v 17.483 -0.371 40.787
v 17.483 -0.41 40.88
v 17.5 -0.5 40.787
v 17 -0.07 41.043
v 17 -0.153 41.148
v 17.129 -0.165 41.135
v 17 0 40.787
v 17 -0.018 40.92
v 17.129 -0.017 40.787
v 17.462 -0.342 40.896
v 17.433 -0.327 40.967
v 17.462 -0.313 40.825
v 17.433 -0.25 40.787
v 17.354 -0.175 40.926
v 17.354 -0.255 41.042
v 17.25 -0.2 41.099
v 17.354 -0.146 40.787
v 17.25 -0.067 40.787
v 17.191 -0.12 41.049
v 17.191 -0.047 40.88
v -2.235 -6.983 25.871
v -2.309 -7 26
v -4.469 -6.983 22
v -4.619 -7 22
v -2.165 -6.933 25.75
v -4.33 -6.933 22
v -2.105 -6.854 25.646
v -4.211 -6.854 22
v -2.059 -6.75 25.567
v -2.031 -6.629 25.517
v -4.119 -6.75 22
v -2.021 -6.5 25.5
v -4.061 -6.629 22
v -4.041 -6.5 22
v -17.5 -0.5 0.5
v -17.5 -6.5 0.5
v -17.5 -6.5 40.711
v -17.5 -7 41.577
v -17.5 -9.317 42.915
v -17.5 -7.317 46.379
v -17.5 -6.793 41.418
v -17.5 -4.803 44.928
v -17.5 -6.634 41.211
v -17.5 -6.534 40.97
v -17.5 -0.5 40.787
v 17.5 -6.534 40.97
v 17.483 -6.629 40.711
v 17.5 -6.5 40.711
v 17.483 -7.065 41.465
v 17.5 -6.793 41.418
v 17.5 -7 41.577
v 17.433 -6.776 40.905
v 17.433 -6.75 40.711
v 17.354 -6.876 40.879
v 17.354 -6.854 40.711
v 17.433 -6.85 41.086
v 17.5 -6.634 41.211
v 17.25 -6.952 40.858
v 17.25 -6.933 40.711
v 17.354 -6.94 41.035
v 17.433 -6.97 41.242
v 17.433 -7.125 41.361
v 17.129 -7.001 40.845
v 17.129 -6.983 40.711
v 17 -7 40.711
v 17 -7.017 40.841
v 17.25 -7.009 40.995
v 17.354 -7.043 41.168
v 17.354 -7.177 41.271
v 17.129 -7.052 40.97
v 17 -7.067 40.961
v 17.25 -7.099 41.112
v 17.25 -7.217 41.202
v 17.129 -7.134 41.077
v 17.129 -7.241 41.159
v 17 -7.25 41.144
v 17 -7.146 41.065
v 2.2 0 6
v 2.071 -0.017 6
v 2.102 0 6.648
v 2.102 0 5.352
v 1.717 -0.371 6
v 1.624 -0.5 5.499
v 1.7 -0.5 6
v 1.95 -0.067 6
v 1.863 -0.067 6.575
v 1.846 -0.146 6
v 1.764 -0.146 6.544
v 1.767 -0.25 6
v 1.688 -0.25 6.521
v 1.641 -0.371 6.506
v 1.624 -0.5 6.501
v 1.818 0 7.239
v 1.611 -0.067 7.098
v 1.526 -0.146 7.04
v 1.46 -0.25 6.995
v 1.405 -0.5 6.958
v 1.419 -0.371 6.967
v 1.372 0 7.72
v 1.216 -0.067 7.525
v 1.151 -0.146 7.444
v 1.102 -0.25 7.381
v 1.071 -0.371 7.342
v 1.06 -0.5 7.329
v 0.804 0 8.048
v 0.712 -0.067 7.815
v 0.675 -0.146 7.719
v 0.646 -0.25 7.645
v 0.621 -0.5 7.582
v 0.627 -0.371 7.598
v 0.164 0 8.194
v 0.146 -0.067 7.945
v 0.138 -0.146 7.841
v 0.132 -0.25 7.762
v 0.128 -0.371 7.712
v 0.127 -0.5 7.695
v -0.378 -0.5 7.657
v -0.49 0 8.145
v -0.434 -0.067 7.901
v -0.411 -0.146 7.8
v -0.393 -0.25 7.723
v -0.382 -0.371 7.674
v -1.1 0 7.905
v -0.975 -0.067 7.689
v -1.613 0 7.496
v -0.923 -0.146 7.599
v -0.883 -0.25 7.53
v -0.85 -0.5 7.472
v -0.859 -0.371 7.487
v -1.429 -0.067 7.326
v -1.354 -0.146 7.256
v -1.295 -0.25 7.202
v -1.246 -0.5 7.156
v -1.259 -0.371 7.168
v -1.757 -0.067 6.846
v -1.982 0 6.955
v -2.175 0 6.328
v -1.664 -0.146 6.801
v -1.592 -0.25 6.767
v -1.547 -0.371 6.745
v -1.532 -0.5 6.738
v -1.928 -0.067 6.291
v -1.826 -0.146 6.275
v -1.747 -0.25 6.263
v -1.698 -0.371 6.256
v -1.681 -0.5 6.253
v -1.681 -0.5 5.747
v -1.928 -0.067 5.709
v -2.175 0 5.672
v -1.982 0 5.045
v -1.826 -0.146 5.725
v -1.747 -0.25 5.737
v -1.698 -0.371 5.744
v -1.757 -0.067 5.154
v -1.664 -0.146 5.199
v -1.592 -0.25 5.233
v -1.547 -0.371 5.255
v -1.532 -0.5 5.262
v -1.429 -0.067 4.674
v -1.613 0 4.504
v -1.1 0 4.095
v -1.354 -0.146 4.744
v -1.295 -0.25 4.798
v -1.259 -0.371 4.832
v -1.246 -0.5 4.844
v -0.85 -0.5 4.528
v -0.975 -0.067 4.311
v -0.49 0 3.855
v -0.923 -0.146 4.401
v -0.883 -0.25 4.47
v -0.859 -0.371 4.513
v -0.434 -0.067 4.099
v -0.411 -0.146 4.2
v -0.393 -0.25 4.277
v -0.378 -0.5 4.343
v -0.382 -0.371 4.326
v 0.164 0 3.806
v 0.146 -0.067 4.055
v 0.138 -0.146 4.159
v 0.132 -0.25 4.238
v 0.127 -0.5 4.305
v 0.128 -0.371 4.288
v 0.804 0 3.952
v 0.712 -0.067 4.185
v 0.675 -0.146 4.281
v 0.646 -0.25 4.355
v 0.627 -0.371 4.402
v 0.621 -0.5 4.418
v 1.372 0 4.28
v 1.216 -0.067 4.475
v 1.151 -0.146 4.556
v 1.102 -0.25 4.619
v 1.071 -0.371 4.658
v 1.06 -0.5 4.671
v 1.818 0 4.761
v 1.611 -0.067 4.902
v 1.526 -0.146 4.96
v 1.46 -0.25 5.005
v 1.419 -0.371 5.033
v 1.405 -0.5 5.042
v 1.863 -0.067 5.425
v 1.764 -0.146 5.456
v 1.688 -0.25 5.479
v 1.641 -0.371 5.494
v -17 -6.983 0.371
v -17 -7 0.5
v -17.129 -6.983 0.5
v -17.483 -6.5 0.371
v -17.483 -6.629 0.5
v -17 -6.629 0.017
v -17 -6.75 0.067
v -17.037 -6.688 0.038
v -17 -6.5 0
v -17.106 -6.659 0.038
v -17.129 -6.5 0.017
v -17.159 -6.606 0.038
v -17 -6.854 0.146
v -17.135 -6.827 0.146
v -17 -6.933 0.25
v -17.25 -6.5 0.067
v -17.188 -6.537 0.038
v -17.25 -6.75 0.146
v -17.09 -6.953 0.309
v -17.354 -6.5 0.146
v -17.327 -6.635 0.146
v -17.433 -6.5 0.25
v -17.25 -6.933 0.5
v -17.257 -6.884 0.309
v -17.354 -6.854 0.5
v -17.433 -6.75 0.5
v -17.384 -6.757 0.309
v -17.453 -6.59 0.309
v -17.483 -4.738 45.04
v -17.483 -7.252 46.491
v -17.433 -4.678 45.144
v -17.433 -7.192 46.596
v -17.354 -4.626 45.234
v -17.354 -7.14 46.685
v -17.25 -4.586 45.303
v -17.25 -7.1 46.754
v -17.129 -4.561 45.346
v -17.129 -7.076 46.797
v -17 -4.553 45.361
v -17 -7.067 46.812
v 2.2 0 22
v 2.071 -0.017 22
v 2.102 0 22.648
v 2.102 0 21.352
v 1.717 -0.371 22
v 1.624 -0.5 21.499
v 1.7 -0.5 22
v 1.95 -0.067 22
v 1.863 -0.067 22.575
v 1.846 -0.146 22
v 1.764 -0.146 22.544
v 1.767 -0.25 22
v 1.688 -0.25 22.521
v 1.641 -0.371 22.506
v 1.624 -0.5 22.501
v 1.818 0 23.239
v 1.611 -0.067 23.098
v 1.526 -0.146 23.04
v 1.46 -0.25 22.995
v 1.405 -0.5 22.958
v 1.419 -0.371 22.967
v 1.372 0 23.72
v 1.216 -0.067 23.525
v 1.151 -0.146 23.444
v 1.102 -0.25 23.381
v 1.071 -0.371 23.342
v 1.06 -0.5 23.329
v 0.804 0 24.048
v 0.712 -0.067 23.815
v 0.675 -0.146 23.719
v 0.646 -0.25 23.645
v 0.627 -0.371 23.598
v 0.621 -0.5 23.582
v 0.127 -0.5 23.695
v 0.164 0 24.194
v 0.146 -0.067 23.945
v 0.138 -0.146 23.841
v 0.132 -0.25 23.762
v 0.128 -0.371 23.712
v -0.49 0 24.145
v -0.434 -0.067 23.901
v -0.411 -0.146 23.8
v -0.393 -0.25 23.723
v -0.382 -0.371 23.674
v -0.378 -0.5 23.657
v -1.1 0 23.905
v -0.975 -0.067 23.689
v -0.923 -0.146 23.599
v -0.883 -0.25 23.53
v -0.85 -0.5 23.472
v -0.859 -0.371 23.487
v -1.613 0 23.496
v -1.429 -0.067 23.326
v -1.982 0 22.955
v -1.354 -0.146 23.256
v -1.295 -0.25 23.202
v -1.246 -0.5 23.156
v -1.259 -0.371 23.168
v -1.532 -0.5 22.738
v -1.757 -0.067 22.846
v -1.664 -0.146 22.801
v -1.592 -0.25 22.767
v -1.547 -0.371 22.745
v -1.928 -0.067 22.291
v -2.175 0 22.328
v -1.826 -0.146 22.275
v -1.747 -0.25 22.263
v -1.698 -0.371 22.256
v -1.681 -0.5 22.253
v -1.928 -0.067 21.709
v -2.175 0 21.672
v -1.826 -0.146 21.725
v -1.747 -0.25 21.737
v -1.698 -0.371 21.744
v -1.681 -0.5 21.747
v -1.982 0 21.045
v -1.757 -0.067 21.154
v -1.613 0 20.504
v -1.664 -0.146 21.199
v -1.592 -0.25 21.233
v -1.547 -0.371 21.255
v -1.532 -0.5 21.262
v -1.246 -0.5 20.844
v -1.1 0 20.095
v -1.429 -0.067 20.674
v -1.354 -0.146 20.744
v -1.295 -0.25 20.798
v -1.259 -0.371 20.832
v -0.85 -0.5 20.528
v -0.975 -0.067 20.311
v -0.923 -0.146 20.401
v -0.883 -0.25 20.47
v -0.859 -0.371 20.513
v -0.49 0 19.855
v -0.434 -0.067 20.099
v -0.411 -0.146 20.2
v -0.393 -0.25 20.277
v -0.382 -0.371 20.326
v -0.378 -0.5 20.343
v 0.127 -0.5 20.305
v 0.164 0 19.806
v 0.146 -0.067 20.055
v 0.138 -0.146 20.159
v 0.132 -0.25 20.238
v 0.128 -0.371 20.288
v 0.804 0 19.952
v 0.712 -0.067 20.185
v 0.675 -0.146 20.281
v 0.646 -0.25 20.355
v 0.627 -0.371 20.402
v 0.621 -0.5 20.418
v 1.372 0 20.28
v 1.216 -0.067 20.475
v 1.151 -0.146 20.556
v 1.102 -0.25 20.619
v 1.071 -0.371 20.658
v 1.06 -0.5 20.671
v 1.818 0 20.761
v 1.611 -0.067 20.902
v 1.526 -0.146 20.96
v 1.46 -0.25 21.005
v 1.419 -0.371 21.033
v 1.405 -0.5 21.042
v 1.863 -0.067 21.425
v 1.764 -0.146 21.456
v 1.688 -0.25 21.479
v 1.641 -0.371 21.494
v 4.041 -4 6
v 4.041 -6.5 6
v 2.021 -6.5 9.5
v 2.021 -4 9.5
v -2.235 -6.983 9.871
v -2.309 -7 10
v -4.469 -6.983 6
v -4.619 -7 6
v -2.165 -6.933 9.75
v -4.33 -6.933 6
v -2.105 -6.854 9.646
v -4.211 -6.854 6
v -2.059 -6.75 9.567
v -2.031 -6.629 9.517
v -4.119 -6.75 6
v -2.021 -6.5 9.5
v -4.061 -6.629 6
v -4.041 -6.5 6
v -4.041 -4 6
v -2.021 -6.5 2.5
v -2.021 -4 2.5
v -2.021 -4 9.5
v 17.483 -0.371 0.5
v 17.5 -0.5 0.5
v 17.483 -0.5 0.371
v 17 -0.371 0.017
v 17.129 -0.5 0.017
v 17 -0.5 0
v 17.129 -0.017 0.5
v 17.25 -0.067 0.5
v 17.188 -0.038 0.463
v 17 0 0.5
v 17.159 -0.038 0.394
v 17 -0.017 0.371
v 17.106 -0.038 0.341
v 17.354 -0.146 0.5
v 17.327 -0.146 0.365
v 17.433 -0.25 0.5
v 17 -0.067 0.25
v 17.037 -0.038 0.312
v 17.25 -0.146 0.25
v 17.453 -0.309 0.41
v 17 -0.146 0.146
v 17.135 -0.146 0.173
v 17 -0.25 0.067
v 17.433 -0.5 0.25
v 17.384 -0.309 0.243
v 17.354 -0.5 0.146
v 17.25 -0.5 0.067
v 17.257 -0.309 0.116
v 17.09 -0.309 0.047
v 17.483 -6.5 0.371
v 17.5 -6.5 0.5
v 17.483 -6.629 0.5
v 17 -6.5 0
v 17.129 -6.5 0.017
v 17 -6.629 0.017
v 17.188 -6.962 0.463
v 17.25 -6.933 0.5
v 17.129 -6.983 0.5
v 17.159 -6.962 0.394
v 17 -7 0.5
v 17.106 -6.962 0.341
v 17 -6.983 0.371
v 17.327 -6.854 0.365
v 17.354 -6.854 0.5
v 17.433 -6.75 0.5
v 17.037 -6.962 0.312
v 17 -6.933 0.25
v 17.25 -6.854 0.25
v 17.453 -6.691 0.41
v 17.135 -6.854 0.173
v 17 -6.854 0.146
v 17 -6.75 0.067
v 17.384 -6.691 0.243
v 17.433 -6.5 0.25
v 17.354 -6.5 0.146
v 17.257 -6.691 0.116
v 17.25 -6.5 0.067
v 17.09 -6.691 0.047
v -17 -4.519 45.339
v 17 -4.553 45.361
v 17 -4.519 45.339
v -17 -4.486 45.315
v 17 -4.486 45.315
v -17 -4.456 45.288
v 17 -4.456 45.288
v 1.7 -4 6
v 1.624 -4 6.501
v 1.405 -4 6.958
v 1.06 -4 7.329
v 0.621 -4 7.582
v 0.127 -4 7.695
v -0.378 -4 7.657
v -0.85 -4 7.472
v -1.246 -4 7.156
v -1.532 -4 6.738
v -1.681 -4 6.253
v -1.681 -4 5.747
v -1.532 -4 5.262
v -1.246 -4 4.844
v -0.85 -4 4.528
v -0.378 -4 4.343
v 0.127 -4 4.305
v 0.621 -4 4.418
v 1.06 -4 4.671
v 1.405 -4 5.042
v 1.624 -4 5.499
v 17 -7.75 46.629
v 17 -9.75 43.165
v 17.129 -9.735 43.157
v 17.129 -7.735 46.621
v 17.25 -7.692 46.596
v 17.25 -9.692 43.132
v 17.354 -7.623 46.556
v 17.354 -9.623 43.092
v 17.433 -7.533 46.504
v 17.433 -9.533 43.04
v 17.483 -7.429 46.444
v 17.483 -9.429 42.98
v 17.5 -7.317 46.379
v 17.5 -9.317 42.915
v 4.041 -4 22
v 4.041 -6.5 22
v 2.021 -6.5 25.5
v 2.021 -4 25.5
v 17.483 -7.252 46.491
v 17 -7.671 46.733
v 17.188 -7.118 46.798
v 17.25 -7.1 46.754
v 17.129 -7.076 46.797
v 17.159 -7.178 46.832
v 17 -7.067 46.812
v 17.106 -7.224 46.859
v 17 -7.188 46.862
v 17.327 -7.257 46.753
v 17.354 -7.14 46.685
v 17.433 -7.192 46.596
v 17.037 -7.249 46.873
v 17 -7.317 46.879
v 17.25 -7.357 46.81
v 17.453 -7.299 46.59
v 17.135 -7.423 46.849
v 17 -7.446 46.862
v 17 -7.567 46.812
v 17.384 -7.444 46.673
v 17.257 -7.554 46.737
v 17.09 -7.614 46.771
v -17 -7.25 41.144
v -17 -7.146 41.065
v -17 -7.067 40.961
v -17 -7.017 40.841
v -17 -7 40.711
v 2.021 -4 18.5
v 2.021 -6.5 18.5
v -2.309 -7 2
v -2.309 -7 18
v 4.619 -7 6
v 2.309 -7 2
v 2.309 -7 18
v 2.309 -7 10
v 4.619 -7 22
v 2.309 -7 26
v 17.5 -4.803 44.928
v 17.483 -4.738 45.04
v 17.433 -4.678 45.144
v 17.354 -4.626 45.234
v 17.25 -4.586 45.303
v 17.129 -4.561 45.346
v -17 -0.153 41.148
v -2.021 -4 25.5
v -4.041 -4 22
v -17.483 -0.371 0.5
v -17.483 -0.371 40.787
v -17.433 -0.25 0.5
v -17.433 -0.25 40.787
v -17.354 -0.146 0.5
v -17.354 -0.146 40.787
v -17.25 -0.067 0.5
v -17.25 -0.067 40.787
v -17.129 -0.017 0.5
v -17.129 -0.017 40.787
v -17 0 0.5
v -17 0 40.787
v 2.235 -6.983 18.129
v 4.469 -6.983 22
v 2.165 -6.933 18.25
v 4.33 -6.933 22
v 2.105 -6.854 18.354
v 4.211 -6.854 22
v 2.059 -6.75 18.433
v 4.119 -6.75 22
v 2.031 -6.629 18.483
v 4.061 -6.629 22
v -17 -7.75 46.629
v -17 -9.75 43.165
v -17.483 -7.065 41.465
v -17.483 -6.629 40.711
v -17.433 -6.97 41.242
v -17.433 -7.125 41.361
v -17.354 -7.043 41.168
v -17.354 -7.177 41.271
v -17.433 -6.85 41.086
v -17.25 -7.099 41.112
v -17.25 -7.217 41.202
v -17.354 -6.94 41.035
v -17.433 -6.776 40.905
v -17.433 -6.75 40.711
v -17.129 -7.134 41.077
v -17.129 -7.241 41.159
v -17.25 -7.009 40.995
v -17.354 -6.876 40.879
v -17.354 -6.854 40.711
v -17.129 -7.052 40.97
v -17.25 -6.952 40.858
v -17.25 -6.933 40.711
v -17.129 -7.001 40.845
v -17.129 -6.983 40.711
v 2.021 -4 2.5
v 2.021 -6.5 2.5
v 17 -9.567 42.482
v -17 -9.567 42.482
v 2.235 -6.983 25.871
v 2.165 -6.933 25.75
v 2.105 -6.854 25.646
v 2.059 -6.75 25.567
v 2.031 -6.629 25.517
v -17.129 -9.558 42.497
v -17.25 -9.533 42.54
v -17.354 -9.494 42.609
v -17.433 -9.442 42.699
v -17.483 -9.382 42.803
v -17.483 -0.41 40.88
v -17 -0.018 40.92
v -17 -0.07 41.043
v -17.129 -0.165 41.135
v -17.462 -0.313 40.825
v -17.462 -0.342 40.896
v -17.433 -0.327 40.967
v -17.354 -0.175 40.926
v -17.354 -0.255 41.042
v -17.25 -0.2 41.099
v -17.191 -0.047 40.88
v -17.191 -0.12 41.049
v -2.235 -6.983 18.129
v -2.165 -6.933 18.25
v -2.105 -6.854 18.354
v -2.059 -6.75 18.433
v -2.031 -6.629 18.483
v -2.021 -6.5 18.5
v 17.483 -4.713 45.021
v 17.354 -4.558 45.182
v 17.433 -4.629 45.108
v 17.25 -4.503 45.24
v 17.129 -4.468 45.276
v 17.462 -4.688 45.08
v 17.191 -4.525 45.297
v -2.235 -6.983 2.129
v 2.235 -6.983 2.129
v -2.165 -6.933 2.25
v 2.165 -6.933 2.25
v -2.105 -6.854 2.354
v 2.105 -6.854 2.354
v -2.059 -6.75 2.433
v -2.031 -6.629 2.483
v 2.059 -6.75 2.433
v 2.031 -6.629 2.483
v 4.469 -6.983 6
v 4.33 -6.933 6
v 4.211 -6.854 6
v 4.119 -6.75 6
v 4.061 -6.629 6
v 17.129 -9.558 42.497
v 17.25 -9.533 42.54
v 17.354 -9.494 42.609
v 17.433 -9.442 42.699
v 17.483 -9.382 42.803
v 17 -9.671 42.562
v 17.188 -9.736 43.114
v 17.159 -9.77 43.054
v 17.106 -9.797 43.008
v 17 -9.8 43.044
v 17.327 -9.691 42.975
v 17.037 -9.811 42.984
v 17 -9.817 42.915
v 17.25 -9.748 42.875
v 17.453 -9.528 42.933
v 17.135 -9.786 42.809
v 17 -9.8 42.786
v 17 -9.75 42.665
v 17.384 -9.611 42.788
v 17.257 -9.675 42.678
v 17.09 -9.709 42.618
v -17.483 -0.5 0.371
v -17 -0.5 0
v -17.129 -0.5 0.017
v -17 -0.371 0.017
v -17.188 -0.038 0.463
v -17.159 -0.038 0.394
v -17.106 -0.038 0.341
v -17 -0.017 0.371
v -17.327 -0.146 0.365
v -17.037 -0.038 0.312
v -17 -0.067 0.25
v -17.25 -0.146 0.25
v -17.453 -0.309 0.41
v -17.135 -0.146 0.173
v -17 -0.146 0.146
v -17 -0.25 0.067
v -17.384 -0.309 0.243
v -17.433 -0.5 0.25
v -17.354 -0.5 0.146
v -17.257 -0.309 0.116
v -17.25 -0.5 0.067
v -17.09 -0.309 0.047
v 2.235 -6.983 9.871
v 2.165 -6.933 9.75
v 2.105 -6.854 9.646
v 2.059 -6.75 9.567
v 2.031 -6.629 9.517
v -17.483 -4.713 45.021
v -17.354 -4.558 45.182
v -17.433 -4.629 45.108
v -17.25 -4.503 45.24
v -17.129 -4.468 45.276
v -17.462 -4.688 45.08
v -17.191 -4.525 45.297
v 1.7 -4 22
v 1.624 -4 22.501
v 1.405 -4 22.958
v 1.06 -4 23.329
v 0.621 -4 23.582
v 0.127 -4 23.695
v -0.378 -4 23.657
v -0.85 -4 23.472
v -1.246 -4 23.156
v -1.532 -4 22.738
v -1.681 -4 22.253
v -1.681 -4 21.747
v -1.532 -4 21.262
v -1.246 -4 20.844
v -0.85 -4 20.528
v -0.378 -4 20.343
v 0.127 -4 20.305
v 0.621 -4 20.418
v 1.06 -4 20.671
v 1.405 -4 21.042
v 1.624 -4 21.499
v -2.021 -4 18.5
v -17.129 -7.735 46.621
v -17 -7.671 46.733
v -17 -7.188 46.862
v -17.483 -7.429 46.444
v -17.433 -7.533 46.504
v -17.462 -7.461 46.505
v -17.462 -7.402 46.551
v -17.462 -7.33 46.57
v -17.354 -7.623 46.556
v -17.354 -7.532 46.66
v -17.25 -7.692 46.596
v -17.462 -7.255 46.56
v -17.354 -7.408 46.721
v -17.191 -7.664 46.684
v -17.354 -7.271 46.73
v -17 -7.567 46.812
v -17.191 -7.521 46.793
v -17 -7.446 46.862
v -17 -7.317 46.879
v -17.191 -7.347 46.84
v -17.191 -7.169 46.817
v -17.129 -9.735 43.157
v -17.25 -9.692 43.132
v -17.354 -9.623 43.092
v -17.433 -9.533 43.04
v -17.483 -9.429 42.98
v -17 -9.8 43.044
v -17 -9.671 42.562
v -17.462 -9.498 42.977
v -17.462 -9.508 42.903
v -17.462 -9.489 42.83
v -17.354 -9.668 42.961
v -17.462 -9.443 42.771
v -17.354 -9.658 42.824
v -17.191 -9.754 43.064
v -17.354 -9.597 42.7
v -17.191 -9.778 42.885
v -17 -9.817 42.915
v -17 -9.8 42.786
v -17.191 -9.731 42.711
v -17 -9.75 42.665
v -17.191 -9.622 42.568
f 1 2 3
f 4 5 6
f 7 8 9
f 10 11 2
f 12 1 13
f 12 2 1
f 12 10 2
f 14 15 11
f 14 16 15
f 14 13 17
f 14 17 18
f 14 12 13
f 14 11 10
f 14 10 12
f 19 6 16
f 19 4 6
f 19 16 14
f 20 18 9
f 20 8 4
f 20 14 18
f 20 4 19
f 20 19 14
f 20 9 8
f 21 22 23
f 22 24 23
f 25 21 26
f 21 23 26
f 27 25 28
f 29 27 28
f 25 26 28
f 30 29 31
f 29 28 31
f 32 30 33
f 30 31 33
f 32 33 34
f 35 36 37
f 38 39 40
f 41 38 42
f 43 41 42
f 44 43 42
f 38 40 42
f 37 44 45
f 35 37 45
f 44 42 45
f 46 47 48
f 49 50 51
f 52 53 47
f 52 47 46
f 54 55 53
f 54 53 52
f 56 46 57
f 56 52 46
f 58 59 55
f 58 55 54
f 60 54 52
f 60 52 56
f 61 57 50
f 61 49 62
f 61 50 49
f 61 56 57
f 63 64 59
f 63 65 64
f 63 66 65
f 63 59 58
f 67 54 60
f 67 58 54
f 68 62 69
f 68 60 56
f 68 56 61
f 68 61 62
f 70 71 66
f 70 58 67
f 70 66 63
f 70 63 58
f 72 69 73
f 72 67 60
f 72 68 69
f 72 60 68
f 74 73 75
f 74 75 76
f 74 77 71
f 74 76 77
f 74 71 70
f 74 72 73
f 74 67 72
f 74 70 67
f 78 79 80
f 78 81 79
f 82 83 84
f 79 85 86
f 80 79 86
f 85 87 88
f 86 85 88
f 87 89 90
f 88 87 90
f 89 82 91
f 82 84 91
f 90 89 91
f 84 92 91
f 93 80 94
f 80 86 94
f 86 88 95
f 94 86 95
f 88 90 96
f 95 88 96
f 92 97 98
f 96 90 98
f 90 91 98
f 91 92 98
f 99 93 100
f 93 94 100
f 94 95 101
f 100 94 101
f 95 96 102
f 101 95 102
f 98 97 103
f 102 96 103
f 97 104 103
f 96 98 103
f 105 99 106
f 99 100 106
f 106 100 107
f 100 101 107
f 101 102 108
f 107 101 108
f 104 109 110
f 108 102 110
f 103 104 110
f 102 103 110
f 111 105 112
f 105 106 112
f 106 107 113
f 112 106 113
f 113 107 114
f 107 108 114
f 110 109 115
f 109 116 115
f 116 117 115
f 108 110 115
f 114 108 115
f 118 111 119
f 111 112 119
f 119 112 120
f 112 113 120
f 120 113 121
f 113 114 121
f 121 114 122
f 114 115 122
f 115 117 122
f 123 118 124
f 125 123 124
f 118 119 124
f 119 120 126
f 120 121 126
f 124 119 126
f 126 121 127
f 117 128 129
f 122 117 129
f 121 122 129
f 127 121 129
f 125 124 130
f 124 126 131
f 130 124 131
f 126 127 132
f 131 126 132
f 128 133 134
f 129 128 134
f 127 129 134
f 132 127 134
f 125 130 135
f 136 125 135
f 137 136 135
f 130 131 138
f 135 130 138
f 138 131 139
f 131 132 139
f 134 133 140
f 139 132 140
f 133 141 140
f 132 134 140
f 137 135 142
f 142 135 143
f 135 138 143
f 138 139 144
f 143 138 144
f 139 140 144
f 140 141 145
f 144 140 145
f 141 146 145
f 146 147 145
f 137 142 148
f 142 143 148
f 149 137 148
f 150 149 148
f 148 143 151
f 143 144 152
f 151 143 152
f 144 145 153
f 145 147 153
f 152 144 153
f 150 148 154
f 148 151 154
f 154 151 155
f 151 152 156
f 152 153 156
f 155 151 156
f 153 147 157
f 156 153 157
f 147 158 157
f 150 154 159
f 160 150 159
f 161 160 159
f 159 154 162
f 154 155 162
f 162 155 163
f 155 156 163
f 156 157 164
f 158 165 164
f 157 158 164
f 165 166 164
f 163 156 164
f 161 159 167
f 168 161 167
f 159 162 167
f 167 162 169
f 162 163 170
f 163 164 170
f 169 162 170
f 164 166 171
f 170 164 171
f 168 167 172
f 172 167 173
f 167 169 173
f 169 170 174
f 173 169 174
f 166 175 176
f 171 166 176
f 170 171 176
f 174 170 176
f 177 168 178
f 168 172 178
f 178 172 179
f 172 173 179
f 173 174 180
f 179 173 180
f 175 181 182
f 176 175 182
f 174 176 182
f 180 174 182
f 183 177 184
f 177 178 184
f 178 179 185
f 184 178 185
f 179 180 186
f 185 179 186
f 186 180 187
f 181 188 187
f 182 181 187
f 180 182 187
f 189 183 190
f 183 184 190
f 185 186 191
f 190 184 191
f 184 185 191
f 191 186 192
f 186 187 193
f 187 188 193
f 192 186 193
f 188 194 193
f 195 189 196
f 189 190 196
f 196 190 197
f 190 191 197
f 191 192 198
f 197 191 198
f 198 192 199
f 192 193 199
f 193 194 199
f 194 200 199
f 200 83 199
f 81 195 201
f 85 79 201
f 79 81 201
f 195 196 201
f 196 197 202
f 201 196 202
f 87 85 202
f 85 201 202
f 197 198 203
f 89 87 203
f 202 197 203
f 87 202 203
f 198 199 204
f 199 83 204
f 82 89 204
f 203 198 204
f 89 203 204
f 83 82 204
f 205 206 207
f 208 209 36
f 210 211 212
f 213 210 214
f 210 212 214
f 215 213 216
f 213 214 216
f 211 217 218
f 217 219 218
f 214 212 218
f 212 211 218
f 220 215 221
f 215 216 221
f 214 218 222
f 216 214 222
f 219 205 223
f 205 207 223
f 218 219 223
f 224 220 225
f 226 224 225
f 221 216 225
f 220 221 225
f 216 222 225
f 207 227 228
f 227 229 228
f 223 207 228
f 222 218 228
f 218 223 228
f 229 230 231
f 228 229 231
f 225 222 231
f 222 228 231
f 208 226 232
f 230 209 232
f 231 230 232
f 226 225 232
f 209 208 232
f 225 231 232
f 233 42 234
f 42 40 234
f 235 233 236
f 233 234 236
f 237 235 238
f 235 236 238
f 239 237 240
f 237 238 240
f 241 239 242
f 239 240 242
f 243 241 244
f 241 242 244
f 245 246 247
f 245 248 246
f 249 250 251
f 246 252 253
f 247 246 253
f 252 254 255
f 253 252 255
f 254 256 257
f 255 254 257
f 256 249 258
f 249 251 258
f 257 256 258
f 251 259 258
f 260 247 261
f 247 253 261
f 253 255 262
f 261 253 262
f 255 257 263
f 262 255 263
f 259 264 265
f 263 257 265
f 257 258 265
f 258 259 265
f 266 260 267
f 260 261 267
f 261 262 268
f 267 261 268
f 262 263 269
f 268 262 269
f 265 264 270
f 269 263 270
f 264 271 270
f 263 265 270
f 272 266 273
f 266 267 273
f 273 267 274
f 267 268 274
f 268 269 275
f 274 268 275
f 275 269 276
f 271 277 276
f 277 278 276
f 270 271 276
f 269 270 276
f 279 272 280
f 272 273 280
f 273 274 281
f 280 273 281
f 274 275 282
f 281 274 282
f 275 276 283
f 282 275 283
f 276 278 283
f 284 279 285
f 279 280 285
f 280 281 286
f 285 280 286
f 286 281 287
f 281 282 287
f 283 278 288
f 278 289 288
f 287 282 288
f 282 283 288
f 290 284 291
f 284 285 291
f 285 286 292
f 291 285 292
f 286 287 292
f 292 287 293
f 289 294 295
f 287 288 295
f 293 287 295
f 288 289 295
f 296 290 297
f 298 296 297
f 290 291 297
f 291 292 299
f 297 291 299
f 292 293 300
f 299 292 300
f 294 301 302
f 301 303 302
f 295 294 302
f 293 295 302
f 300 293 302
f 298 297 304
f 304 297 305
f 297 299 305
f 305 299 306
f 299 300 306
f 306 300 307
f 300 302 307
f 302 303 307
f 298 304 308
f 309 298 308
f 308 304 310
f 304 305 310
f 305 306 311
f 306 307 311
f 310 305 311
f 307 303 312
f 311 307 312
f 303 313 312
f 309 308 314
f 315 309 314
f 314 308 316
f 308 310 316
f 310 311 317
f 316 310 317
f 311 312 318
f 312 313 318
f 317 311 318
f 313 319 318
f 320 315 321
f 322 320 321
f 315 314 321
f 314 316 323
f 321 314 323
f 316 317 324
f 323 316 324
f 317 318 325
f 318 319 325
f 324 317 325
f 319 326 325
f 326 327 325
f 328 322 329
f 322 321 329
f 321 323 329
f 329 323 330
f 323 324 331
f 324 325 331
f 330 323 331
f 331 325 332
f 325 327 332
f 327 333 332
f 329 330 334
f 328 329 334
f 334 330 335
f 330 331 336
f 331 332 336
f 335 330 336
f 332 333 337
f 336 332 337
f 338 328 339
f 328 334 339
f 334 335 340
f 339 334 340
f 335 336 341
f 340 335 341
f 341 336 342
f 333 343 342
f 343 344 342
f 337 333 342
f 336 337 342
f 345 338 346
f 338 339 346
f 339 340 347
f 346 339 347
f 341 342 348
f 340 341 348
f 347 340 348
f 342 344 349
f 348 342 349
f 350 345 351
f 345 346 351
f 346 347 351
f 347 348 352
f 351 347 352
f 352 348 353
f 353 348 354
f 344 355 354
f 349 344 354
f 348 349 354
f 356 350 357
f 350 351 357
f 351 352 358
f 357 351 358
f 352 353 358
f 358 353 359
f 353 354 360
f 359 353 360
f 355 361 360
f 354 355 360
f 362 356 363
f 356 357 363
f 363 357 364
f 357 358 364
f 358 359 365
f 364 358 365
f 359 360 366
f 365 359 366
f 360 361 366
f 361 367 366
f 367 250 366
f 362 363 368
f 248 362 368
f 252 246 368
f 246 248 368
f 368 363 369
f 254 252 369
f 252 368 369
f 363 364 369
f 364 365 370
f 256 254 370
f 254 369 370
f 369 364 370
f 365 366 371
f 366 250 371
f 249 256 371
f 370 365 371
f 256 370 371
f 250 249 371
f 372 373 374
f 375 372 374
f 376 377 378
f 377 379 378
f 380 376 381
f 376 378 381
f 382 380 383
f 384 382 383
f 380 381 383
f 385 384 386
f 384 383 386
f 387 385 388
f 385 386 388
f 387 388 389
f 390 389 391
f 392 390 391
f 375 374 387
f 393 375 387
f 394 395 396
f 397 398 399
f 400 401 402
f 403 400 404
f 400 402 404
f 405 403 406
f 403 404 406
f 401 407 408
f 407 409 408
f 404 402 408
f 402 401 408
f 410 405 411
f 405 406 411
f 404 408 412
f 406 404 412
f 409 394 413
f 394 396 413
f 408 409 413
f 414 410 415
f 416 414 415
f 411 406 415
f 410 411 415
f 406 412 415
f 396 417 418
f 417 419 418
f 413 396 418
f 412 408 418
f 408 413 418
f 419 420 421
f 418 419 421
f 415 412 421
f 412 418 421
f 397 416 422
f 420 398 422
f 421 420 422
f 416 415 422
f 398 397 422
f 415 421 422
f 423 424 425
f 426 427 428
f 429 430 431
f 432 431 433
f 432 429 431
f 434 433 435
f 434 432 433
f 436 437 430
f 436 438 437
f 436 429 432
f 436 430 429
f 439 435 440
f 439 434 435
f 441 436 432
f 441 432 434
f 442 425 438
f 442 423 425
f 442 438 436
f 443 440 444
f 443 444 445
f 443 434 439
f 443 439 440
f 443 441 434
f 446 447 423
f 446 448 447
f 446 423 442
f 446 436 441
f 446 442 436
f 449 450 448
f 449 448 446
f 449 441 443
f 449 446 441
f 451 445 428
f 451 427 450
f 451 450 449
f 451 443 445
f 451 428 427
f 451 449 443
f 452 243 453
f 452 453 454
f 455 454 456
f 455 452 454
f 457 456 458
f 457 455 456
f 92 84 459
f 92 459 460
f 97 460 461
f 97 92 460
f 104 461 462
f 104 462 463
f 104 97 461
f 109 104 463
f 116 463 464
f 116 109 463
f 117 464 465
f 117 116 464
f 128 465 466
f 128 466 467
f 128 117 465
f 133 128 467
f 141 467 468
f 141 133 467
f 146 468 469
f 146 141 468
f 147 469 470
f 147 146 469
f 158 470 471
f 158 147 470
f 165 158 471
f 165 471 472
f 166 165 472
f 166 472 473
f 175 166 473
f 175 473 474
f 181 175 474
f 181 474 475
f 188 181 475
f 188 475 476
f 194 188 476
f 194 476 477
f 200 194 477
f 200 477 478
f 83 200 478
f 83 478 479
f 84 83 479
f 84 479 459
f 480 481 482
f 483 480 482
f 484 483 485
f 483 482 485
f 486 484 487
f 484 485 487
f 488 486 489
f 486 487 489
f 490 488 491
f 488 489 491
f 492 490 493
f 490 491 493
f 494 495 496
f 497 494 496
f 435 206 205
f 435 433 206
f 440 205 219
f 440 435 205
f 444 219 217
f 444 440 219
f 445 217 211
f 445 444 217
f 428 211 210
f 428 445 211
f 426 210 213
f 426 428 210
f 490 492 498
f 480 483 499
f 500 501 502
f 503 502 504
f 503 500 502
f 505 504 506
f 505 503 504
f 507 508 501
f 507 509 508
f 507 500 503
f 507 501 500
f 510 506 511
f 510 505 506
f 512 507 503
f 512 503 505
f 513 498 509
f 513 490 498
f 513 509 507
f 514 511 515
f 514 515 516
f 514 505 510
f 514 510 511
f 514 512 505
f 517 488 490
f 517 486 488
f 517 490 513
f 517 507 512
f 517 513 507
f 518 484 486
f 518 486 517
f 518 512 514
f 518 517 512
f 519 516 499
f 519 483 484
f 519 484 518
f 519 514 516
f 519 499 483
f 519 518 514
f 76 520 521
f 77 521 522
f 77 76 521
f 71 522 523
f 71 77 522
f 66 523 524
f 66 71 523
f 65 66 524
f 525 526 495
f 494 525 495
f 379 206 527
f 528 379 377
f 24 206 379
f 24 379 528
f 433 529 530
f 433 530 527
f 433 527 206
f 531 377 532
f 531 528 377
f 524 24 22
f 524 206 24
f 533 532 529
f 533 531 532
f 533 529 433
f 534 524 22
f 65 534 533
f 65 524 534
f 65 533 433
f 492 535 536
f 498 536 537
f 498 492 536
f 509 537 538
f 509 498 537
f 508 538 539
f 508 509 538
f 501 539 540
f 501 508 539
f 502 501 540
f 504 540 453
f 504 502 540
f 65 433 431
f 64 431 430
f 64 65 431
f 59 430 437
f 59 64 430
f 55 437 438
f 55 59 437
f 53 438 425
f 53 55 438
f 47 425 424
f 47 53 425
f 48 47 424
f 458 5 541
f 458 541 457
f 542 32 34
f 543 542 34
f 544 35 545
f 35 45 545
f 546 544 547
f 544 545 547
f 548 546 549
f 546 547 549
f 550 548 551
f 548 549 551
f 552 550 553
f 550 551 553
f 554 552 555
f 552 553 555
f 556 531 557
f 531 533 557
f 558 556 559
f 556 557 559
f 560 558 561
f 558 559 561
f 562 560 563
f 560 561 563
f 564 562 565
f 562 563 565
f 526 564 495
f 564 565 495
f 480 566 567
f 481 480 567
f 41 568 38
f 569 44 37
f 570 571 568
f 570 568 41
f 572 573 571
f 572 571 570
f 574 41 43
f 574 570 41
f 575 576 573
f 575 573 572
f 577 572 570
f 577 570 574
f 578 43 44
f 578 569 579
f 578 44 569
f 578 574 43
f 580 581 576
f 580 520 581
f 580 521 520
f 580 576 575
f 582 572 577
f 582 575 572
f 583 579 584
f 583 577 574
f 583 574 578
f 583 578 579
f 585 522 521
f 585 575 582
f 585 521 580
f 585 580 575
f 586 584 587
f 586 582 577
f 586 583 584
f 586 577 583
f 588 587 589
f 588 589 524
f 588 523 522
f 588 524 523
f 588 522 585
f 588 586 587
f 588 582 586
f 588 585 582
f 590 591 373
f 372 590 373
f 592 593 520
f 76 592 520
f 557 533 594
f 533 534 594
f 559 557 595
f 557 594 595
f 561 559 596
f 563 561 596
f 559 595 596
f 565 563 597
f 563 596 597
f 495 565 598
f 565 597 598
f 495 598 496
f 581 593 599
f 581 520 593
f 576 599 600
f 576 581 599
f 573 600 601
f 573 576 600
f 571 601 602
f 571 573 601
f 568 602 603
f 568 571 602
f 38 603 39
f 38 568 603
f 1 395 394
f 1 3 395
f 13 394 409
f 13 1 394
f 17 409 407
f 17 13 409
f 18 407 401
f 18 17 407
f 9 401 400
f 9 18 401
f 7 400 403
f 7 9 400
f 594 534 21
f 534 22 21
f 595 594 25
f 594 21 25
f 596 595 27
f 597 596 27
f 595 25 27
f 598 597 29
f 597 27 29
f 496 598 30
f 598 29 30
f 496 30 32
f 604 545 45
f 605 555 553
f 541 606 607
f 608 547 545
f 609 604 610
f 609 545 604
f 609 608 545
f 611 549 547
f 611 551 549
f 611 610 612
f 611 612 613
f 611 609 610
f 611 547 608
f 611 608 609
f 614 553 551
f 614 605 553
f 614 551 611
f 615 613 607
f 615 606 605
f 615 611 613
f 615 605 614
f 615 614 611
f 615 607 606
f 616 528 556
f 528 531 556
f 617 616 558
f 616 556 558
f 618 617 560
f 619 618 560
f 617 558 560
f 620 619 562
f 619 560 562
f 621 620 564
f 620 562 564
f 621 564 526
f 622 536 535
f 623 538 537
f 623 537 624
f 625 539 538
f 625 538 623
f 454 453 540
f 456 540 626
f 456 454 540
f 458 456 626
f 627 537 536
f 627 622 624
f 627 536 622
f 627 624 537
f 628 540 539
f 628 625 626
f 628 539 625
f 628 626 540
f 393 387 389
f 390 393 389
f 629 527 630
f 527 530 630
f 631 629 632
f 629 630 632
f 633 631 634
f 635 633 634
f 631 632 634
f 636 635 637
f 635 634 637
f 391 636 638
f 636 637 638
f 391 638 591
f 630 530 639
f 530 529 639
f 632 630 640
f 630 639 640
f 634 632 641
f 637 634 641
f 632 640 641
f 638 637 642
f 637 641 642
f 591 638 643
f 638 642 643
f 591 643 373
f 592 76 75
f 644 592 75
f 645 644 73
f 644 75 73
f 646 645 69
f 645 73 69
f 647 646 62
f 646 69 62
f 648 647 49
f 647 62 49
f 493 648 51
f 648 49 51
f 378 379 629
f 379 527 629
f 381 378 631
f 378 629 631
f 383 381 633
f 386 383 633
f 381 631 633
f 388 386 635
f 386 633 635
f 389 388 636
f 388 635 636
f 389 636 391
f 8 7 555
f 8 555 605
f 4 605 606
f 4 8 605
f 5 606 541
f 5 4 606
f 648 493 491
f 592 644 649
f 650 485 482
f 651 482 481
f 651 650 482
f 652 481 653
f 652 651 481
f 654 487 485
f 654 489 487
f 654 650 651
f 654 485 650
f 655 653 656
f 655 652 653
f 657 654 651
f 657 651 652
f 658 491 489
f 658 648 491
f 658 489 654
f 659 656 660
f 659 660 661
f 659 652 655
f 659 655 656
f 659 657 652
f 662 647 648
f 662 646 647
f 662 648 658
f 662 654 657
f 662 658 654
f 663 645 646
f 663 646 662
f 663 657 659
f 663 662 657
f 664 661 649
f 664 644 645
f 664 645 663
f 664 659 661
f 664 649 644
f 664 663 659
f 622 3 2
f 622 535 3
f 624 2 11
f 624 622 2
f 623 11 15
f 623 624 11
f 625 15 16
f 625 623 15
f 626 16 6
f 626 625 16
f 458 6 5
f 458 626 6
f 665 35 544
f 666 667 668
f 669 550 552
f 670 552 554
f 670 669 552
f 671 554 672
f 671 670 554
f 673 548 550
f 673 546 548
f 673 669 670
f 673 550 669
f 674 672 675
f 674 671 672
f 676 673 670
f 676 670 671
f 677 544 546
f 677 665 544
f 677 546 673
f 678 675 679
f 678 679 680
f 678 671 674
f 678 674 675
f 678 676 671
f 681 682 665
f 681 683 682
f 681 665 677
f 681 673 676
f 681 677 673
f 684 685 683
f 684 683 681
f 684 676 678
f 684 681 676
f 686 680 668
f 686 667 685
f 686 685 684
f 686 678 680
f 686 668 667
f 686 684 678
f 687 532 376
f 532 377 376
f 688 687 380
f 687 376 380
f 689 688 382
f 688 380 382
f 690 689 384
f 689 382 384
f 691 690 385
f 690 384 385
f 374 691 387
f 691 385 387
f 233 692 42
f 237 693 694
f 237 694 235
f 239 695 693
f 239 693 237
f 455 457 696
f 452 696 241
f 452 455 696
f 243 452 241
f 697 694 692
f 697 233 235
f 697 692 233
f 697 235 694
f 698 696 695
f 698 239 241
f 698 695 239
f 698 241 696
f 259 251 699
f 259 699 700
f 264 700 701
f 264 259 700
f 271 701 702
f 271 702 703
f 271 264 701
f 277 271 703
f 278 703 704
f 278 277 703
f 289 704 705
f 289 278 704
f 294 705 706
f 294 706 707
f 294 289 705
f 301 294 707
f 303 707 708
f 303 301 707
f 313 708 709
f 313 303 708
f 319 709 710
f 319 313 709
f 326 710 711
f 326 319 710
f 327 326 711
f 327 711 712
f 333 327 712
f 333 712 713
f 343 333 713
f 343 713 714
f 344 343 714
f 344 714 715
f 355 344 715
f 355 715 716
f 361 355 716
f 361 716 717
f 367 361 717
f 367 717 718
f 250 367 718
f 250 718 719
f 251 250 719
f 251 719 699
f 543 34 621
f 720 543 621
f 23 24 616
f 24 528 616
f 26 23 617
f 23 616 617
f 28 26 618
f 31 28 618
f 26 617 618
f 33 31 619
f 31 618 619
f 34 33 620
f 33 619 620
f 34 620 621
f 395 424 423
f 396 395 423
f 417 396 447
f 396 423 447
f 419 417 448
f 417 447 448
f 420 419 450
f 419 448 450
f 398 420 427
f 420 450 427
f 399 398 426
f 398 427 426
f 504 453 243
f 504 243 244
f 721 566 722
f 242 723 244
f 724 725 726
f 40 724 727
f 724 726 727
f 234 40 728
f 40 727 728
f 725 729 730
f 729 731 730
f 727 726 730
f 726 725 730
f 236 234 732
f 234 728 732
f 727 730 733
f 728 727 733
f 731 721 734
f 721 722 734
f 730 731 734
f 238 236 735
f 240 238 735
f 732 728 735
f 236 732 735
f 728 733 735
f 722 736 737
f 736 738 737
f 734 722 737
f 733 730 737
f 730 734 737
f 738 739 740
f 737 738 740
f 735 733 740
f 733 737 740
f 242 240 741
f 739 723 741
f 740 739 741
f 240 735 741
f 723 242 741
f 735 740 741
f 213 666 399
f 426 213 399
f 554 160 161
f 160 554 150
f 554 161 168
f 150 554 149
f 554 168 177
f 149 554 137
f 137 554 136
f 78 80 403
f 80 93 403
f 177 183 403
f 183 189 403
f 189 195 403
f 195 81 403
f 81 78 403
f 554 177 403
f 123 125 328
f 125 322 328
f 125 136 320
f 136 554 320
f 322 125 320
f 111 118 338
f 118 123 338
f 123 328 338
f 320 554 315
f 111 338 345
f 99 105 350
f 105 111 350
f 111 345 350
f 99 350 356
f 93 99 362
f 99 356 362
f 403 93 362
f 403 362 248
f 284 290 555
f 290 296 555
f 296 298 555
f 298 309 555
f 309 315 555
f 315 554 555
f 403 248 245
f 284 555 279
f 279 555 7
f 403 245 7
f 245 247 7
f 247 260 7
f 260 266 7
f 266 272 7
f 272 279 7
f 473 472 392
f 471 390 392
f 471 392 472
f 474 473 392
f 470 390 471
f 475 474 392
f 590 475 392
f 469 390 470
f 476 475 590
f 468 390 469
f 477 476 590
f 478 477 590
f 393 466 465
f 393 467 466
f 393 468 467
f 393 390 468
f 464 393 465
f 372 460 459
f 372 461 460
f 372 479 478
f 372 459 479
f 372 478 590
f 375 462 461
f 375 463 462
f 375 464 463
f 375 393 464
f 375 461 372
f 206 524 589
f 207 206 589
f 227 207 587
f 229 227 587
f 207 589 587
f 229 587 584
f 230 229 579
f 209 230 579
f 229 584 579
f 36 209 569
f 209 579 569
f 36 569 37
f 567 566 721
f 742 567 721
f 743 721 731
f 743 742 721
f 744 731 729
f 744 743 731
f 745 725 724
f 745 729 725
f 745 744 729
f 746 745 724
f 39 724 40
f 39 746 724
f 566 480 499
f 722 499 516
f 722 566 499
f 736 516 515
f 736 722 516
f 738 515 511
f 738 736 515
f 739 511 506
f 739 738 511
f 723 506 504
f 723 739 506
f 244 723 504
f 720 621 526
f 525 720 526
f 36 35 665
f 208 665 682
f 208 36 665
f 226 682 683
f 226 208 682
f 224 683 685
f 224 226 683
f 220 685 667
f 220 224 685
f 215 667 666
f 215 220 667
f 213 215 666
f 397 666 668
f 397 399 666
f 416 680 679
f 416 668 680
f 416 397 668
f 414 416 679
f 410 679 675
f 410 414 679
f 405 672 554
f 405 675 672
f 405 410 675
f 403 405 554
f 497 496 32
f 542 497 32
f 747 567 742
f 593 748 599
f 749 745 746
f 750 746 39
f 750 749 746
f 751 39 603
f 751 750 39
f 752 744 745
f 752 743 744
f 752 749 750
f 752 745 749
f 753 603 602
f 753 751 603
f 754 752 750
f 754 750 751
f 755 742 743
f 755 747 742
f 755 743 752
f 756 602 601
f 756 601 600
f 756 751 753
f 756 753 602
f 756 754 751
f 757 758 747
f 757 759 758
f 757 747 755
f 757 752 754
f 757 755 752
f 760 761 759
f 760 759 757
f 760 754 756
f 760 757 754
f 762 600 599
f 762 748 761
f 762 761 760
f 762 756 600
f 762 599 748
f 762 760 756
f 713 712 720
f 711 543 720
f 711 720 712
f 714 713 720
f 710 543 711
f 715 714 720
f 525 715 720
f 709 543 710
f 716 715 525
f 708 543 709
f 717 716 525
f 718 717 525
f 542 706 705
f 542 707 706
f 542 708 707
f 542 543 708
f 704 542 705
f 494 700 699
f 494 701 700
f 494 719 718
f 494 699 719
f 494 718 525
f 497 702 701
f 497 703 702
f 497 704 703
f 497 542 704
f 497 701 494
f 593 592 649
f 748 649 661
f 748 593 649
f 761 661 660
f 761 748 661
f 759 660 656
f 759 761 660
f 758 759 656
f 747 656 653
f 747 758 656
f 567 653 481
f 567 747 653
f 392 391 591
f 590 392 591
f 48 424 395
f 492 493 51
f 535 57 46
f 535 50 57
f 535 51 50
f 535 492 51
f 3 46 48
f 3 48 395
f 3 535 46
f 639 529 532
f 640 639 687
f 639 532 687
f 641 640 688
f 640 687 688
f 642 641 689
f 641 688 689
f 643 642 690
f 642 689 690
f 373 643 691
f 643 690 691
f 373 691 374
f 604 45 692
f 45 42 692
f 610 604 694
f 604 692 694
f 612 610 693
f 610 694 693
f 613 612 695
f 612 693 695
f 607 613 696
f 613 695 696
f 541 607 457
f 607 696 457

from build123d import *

# Parameters (mm, degrees)
F0_W     = 35
F0_H     = 41
F0_R     = 1.7
F1_DEPTH = 7
F3_DEPTH = 35
F4_R     = 1.7
F5_DEPTH = 3
F6_R     = 0.5


with BuildPart() as f1:
    # F0 (on Front) → F1 (new body)
    with BuildSketch(Plane.XZ):
        with Locations((0, 20.5)):
            Rectangle(F0_W, F0_H)
        with Locations((0, 6)):
            Circle(F0_R, mode=Mode.SUBTRACT)
        with Locations((0, 22)):
            Circle(F0_R, mode=Mode.SUBTRACT)
    extrude(amount=F1_DEPTH)

    # F2 (on face) → F3 (join, through all)
    with BuildSketch(Plane.YZ.offset(17.5)):
        Polygon((-10, 42.732051), (-7, 41), (0, 41), (-4.5, 45.330127), (-7.5, 47.062178), align=None)
    extrude(amount=-F3_DEPTH)

    # F4 (on face) → F5 (cut)
    with BuildSketch(Plane.XZ.offset(7)):
        Polygon((4.041452, 22), (2.020726, 25.5), (-2.020726, 25.5), (-4.041452, 22), (-2.020726, 18.5), (2.020726, 18.5), align=None)
        with Locations((0, 22)):
            Circle(F4_R, mode=Mode.SUBTRACT)
        Polygon((4.041452, 6), (2.020726, 9.5), (-2.020726, 9.5), (-4.041452, 6), (-2.020726, 2.5), (2.020726, 2.5), align=None)
        with Locations((0, 6)):
            Circle(F4_R, mode=Mode.SUBTRACT)
    extrude(amount=-F5_DEPTH, mode=Mode.SUBTRACT)

    # F6
    f6_edges = [f1.edges().sort_by_distance(p)[0] for p in [
        (17.5, -3.5, 0),
        (17.5, -7, 20.5),
        (17.5, -8.5, 41.866025),
        (17.5, -8.75, 44.897114),
        (17.5, -6, 46.196152),
        (17.5, -2.25, 43.165064),
        (17.5, 0, 20.5),
        (-17.5, -7, 20.5),
        (0, -7, 41),
        (0, -7, 0),
        (3.031089, -7, 7.75),
        (0, -7, 9.5),
        (-3.031089, -7, 7.75),
        (-3.031089, -7, 4.25),
        (0, -7, 2.5),
        (3.031089, -7, 4.25),
        (3.031089, -7, 20.25),
        (3.031089, -7, 23.75),
        (0, -7, 25.5),
        (-3.031089, -7, 23.75),
        (-3.031089, -7, 20.25),
        (0, -7, 18.5),
        (0, -7.5, 47.062178),
        (0, -10, 42.732051),
        (-17.5, -8.75, 44.897114),
        (-17.5, -3.5, 0),
        (-17.5, 0, 20.5),
        (-17.5, -2.25, 43.165064),
        (-17.5, -6, 46.196152),
        (-17.5, -8.5, 41.866025),
        (0, 0, 0),
        (0, 0, 41),
        (-1.7, 0, 6),
        (-1.7, 0, 22),
        (0, -4.5, 45.330127),
    ]]
    fillet(f6_edges, radius=F6_R)


solid = f1.part
